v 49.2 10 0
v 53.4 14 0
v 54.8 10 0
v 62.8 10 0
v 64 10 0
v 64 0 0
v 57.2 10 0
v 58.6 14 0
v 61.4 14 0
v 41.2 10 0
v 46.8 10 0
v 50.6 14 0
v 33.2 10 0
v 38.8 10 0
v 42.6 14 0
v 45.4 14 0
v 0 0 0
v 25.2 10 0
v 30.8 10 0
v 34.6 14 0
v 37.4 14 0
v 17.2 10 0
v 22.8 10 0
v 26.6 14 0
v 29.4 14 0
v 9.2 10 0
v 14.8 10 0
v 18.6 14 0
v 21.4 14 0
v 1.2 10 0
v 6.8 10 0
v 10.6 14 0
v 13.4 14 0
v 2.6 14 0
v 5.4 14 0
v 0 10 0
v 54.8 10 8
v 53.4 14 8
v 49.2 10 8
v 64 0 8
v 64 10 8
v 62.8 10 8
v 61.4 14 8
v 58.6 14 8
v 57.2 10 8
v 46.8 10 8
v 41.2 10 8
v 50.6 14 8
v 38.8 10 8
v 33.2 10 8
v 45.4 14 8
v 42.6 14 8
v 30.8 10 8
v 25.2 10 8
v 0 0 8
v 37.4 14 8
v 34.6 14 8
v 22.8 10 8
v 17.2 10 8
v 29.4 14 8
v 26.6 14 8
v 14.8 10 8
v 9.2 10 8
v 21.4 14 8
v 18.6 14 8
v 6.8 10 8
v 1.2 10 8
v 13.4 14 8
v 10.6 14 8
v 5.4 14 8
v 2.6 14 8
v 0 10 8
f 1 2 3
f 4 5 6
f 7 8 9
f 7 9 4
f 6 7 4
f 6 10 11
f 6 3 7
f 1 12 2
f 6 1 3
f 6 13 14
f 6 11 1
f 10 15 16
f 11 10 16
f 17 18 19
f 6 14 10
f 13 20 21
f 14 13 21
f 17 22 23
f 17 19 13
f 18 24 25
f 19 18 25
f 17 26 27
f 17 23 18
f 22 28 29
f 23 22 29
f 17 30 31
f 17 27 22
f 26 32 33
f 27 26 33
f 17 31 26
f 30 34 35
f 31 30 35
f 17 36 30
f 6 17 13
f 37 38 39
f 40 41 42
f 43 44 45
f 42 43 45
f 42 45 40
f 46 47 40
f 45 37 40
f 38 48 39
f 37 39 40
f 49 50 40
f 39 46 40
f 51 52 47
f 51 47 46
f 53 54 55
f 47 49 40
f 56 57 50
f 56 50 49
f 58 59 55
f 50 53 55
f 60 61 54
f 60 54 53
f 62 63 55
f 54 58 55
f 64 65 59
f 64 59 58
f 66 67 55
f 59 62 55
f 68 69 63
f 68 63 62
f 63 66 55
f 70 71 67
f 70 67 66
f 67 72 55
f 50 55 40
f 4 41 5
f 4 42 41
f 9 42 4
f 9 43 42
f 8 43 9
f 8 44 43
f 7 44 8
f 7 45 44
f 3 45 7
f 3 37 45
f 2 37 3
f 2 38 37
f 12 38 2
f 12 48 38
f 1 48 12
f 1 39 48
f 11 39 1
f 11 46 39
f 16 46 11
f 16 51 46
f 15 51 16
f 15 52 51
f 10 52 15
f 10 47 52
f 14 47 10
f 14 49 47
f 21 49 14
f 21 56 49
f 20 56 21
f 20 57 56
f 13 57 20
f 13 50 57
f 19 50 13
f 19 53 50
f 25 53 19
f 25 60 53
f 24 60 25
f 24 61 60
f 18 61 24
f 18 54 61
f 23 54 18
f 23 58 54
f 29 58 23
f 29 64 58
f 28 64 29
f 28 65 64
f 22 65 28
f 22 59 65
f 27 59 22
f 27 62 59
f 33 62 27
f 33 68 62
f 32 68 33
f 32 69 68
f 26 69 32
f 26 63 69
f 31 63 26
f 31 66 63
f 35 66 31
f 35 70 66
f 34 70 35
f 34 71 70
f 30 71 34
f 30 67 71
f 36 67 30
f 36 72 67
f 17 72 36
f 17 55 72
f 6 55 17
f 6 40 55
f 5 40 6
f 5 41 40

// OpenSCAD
$fn = 32;

// ----------------------------------------------------------------------
// Gear rack: 8 teeth, pitch 8 mm
// ----------------------------------------------------------------------

// --- parameters (mm) ---
teeth = 8;                // number of teeth
pitch = 8;                // tooth pitch, X
root_w = 5.6;             // tooth width at the root
tip_w = 2.8;              // tooth width at the tip
base_h = 10;              // rack body height, Y
tooth_h = 4;              // tooth height above the body
plate_t = 8;              // rack width, Z (extrusion height)
fit_tol = 0.02;           // declared fit tolerance (prompt contract)
free_tol = 0.2;           // declared free tolerance (prompt contract)

rack_l = teeth * pitch;  // overall length
total_h = base_h + tooth_h;  // overall height

profile = [[0, 0], [64, 0], [64, 10], [62.8, 10], [61.4, 14], [58.6, 14], [57.2, 10], [54.8, 10], [53.4, 14], [50.6, 14], [49.2, 10], [46.8, 10], [45.4, 14], [42.6, 14], [41.2, 10], [38.8, 10], [37.4, 14], [34.6, 14], [33.2, 10], [30.8, 10], [29.4, 14], [26.6, 14], [25.2, 10], [22.8, 10], [21.4, 14], [18.6, 14], [17.2, 10], [14.8, 10], [13.4, 14], [10.6, 14], [9.2, 10], [6.8, 10], [5.4, 14], [2.6, 14], [1.2, 10], [0, 10]];  // primary outline, 36 points, counter clockwise

// --- the one profile operation ---
linear_extrude(height = plate_t) polygon(points = profile);
